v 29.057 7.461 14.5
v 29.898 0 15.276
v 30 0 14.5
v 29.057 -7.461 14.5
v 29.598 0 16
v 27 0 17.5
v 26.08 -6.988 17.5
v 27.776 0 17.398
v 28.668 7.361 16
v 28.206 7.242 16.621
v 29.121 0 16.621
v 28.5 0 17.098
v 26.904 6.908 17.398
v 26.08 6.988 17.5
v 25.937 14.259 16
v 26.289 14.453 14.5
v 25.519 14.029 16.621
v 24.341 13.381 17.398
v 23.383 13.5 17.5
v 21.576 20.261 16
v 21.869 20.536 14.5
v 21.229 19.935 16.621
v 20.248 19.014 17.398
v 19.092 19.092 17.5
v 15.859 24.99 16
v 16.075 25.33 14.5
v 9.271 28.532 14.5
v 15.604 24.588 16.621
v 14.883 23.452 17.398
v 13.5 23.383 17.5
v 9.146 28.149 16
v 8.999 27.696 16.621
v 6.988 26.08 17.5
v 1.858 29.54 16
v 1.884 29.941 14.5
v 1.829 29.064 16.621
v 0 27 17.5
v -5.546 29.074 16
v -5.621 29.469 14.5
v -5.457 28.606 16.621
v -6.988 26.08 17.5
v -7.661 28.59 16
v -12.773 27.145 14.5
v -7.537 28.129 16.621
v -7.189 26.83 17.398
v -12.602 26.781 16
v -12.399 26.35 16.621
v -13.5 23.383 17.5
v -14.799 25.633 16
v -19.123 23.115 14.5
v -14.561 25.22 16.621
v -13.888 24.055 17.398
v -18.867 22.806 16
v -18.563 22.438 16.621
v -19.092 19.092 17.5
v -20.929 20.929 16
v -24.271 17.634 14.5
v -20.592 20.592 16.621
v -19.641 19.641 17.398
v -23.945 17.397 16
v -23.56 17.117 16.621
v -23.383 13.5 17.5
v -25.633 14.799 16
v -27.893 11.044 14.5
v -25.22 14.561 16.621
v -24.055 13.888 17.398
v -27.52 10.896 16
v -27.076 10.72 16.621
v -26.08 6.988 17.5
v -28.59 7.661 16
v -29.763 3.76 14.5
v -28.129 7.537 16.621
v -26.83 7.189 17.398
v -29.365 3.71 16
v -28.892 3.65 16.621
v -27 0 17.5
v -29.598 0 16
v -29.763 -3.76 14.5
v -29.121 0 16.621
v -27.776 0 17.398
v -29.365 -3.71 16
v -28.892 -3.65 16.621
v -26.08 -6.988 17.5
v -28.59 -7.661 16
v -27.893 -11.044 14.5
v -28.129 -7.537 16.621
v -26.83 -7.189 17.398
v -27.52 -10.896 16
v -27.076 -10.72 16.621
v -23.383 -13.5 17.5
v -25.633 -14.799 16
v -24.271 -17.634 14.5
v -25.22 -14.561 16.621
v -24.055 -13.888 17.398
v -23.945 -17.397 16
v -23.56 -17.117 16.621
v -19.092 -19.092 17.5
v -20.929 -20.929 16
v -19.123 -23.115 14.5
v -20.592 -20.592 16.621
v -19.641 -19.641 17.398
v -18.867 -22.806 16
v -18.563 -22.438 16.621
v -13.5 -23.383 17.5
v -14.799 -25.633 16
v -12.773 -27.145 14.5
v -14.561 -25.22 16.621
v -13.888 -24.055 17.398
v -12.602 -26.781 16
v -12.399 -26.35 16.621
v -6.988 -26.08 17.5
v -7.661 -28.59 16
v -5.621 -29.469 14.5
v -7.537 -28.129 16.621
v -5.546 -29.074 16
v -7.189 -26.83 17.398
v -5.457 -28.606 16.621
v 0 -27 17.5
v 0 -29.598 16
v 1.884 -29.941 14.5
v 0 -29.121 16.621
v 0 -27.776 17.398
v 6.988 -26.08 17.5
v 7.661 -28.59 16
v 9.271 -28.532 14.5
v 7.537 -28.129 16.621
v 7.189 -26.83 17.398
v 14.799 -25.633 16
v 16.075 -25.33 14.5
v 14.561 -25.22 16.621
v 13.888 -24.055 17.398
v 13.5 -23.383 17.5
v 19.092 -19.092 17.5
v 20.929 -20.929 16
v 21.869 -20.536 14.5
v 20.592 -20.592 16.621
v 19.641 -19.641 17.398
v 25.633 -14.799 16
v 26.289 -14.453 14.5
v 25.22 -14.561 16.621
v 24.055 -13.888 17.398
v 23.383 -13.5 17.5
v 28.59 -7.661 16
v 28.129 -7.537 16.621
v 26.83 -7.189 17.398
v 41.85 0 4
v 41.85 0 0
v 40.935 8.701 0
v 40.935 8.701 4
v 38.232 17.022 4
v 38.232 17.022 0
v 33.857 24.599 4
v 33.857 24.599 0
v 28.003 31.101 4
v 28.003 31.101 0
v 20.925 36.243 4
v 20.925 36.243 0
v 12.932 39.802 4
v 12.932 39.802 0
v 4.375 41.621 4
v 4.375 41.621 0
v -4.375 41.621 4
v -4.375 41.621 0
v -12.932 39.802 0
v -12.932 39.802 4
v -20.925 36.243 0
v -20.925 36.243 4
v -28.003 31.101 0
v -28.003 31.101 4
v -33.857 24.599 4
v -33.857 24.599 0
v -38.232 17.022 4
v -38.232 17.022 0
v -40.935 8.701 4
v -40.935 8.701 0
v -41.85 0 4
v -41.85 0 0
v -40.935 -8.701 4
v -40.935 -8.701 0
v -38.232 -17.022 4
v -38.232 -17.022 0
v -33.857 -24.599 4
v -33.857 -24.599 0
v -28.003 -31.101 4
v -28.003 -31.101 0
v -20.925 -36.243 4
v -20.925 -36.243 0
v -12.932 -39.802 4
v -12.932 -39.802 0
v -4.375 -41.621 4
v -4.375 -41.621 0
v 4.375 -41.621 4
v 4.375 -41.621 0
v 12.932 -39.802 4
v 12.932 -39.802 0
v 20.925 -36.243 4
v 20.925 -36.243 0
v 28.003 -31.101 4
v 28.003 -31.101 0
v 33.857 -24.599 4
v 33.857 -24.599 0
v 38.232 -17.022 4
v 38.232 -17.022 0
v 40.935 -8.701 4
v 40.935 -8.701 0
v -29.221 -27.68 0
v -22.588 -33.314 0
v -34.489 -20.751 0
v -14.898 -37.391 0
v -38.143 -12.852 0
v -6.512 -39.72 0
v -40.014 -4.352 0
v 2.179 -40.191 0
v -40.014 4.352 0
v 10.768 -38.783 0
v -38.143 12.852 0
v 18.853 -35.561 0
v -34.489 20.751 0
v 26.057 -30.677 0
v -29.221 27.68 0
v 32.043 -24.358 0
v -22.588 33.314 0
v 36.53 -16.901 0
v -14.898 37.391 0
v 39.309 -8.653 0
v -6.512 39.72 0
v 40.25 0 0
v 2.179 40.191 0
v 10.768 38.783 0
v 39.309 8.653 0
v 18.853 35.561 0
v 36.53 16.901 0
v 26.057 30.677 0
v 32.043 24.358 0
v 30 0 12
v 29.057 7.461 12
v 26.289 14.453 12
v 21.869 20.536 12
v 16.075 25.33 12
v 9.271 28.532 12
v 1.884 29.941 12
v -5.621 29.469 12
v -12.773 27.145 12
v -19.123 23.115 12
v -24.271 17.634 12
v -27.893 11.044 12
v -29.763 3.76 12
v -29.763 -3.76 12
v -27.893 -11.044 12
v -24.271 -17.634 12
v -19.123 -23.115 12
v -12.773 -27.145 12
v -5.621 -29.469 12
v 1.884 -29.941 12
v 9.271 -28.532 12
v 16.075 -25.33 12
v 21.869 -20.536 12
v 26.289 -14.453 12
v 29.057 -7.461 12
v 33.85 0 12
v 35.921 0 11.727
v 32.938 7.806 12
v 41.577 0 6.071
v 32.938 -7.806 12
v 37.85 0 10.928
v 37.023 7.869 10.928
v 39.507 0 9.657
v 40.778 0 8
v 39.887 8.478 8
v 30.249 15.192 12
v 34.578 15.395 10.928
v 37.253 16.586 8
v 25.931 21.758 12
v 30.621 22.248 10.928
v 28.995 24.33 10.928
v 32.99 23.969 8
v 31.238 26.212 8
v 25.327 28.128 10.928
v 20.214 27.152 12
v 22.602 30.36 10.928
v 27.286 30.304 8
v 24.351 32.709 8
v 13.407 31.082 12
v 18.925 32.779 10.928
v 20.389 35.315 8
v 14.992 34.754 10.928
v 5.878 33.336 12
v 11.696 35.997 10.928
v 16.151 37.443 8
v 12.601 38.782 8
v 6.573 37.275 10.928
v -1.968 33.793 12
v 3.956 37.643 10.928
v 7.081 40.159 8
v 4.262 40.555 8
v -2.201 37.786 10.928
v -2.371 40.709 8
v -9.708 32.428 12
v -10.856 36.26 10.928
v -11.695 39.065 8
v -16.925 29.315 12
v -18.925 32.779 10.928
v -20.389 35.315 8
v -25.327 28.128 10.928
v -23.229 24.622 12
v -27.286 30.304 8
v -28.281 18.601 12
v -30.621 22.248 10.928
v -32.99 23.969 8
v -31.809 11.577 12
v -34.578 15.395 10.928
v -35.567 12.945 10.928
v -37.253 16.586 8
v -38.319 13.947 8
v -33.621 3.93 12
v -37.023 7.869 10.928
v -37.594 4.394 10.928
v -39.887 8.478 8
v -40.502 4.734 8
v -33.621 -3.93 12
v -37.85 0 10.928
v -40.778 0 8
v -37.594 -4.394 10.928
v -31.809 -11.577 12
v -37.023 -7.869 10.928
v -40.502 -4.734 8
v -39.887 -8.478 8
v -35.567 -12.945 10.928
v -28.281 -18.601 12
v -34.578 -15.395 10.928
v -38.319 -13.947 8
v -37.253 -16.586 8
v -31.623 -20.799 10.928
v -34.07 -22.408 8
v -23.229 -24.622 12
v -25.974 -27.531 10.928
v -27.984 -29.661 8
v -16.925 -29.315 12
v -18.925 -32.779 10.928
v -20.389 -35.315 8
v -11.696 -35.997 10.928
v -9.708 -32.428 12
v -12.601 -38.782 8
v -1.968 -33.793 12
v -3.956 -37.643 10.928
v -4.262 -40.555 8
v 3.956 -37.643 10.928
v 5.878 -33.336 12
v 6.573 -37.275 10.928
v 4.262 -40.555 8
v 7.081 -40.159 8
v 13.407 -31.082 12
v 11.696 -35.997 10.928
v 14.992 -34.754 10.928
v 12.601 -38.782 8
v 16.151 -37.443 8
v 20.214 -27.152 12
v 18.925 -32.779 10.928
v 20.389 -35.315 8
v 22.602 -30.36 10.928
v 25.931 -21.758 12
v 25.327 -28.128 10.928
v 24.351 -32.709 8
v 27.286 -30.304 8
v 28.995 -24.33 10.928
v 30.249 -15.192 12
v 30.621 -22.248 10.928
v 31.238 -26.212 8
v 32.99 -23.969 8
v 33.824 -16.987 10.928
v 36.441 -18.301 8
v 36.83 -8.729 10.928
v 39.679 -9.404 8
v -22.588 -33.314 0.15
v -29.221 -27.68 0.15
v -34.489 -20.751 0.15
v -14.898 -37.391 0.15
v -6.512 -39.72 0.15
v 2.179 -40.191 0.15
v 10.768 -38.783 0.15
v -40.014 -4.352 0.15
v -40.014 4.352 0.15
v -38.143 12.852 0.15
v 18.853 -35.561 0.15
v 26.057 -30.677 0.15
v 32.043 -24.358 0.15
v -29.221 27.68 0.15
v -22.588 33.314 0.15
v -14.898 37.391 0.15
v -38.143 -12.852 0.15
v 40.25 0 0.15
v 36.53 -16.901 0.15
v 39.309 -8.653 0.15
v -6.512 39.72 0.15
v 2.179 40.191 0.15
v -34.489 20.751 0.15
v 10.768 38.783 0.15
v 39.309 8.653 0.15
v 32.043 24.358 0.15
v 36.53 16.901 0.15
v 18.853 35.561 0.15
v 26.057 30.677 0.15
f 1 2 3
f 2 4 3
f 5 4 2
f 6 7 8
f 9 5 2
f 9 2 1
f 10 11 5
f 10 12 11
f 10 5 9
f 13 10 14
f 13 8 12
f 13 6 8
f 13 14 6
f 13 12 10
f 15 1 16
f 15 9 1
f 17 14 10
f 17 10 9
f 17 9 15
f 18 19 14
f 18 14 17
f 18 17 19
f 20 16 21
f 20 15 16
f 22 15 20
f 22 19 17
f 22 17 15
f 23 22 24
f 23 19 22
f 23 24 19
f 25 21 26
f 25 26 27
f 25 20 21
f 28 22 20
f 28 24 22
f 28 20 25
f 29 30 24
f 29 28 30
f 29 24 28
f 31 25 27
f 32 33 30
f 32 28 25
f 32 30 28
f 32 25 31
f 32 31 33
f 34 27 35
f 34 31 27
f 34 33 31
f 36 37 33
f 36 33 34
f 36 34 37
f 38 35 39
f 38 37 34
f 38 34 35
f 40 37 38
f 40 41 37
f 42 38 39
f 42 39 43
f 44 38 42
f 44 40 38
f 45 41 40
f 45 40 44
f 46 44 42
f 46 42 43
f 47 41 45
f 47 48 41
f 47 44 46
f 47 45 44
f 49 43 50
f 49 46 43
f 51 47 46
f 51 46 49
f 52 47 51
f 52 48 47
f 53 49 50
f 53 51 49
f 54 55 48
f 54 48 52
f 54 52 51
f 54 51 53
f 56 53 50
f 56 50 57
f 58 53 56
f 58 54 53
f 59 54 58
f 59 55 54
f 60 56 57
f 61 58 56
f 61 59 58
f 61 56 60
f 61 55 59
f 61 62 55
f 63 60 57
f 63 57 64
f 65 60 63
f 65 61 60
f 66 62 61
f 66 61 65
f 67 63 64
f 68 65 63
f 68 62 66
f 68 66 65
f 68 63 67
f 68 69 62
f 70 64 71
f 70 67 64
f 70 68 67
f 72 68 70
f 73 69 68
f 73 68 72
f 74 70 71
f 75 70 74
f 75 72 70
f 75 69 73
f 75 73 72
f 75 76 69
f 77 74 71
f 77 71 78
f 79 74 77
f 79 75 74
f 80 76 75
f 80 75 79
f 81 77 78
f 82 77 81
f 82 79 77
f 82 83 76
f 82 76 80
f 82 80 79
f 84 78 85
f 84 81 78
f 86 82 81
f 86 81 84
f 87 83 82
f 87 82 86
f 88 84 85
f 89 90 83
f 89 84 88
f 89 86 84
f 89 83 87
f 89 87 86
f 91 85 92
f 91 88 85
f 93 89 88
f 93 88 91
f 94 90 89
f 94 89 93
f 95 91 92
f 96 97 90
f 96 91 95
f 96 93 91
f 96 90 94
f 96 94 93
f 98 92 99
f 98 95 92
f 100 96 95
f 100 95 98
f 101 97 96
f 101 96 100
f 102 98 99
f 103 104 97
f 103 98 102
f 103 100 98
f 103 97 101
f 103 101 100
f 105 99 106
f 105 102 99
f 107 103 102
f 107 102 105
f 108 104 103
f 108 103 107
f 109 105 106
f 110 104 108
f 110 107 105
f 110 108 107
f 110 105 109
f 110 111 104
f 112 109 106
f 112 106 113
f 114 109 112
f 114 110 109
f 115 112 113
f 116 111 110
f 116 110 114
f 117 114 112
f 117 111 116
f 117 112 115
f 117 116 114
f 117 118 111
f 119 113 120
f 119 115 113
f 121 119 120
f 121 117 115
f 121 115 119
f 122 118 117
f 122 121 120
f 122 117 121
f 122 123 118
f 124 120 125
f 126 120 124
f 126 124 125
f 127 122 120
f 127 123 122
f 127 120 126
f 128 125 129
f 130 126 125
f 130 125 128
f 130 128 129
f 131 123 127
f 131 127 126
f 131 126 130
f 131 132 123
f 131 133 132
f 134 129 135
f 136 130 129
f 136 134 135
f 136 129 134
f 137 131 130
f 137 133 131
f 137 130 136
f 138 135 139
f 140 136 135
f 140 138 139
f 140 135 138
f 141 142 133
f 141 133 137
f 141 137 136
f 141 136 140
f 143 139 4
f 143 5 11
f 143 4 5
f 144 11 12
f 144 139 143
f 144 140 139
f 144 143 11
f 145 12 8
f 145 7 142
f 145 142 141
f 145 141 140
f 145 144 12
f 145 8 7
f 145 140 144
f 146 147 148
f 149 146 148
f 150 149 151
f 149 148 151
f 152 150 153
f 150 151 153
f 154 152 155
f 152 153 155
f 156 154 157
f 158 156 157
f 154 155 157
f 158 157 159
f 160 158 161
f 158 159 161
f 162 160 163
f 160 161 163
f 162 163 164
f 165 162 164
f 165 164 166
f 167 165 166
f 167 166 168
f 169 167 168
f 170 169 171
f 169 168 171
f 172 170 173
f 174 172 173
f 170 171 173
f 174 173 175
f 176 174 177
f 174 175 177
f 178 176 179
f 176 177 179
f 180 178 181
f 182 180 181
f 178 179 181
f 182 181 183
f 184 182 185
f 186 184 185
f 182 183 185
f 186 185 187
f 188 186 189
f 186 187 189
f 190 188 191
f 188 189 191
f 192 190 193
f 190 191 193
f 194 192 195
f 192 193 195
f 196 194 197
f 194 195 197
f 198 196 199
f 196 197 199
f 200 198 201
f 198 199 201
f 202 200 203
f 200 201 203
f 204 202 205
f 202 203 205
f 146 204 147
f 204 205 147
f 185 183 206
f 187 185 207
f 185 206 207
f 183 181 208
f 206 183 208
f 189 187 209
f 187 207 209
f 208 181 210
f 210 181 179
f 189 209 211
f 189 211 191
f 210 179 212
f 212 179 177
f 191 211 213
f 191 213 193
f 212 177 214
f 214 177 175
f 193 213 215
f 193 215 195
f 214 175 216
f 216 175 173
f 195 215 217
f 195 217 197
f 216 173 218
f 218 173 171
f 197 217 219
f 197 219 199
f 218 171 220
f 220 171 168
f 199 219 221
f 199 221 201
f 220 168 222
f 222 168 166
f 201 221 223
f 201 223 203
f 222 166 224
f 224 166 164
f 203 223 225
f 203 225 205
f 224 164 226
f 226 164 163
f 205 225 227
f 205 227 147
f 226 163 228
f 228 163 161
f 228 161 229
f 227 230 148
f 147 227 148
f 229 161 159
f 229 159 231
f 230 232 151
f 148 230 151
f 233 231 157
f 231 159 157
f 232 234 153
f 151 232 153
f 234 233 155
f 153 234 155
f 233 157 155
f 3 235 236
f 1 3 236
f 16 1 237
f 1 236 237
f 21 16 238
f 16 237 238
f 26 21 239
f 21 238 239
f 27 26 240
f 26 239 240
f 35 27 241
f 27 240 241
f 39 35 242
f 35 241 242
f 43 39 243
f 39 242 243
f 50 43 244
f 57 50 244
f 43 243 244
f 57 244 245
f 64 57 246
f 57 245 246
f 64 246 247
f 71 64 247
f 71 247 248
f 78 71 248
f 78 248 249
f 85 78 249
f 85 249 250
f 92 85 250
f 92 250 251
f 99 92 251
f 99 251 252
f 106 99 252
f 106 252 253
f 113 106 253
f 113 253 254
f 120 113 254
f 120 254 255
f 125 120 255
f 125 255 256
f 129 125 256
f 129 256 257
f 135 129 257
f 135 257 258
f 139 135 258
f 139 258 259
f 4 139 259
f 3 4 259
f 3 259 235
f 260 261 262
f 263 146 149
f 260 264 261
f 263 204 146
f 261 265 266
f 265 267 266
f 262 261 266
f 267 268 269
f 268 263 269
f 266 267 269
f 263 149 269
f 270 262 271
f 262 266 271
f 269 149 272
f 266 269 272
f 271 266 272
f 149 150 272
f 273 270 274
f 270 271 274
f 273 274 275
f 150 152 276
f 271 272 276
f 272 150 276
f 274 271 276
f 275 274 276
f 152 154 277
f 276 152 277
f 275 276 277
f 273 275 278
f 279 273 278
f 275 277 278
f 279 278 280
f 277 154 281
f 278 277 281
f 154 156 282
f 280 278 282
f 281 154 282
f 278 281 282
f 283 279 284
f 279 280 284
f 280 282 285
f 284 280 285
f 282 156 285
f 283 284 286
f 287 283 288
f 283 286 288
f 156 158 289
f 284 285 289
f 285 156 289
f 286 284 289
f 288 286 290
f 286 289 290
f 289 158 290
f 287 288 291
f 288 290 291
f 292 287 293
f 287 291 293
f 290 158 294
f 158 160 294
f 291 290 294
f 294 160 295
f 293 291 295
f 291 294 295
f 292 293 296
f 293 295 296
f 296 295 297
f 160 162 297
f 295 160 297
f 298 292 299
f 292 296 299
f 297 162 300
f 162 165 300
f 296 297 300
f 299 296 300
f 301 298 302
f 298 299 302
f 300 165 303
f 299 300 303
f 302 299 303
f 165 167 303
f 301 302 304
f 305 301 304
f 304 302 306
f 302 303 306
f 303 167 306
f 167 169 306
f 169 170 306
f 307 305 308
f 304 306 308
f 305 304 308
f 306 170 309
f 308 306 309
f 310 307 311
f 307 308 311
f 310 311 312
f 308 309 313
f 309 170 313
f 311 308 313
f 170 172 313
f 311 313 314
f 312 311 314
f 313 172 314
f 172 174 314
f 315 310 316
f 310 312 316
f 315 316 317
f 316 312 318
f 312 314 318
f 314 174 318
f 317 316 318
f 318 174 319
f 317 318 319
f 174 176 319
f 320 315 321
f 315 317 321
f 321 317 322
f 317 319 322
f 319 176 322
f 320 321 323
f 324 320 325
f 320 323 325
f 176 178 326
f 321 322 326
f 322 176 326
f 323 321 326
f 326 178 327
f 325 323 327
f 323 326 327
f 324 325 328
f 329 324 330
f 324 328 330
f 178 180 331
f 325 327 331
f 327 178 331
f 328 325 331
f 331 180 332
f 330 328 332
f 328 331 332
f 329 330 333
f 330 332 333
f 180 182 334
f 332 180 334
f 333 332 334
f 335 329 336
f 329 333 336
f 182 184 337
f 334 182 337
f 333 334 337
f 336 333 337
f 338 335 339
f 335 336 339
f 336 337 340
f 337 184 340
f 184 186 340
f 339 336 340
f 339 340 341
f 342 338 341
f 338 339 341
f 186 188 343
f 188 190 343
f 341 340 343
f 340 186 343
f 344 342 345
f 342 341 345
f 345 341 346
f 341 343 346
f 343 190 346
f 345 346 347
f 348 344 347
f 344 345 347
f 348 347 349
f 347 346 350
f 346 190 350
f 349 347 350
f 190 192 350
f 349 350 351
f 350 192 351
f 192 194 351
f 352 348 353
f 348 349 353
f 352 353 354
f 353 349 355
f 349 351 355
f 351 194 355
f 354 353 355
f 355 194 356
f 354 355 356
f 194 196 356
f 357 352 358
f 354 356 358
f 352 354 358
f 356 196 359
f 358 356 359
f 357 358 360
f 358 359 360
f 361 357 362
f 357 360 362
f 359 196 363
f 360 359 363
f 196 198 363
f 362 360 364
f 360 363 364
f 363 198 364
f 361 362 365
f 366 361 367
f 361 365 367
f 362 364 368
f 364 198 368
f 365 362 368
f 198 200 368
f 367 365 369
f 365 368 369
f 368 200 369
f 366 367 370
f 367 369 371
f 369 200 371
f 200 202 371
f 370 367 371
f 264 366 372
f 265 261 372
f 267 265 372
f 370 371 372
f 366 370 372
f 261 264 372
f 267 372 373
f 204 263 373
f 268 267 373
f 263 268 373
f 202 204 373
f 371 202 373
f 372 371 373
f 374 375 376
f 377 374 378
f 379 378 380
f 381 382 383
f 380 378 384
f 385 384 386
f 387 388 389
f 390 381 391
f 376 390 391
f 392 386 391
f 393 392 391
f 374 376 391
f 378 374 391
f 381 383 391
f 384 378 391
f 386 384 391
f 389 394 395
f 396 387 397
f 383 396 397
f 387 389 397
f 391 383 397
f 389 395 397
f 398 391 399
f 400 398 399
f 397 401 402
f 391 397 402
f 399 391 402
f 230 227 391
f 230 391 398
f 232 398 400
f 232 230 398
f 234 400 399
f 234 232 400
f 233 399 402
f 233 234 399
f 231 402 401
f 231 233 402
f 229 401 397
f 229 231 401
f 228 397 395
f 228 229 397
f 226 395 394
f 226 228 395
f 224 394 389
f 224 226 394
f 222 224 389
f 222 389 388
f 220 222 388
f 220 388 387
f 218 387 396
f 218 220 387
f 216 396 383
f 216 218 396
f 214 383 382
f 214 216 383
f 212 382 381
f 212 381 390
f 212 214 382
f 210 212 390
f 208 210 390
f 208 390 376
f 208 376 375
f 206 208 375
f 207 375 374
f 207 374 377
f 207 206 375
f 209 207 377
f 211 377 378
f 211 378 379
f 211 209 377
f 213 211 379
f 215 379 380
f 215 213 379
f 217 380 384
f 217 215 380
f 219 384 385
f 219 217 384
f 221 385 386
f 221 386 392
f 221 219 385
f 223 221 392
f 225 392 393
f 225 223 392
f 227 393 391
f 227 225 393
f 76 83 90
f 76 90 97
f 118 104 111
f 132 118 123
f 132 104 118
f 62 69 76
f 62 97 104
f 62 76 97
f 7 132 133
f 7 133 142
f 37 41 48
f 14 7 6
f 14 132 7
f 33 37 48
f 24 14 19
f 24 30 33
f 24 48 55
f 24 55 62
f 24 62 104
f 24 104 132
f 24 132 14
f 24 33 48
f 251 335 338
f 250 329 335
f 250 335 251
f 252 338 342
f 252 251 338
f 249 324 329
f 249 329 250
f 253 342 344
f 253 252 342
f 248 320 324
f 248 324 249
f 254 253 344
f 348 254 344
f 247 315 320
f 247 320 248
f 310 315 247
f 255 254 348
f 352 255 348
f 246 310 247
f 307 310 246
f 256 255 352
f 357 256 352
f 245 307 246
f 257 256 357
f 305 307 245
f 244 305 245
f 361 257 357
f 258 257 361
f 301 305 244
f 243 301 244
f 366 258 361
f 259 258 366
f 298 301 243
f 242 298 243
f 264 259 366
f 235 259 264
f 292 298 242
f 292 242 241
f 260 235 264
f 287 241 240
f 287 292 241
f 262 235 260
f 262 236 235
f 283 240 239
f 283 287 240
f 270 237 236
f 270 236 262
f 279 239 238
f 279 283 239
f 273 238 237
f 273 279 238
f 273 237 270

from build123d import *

# Parameters (mm, degrees)
F0_R     = 30
F1_DEPTH = 17.5
F0_R_2   = 41.85
F0_R_3   = 40.25
F2_DEPTH = 12
F3_DEPTH = 0.15
F4_R     = 3
F5_R     = 8


with BuildPart() as f1:
    # F0 (on Top) → F1 (new body)
    with BuildSketch(Plane.XY):
        Circle(F0_R)
    extrude(amount=F1_DEPTH)

    # F0 (on Top) → F2 (join)
    with BuildSketch(Plane.XY):
        Circle(F0_R_2)
        Circle(F0_R_3, mode=Mode.SUBTRACT)
        Circle(F0_R_3)
        Circle(F0_R, mode=Mode.SUBTRACT)
    extrude(amount=F2_DEPTH)

    # F0 (on Top) → F3 (cut)
    with BuildSketch(Plane.XY):
        Circle(F0_R_3)
        Circle(F0_R, mode=Mode.SUBTRACT)
        Circle(F0_R)
    extrude(amount=F3_DEPTH, mode=Mode.SUBTRACT)

    # F4
    f4_edges = [f1.edges().sort_by_distance(p)[0] for p in [
        (-30, 0, 17.5),
    ]]
    fillet(f4_edges, radius=F4_R)

    # F5
    f5_edges = [f1.edges().sort_by_distance(p)[0] for p in [
        (-41.85, 0, 12),
    ]]
    fillet(f5_edges, radius=F5_R)


solid = f1.part
